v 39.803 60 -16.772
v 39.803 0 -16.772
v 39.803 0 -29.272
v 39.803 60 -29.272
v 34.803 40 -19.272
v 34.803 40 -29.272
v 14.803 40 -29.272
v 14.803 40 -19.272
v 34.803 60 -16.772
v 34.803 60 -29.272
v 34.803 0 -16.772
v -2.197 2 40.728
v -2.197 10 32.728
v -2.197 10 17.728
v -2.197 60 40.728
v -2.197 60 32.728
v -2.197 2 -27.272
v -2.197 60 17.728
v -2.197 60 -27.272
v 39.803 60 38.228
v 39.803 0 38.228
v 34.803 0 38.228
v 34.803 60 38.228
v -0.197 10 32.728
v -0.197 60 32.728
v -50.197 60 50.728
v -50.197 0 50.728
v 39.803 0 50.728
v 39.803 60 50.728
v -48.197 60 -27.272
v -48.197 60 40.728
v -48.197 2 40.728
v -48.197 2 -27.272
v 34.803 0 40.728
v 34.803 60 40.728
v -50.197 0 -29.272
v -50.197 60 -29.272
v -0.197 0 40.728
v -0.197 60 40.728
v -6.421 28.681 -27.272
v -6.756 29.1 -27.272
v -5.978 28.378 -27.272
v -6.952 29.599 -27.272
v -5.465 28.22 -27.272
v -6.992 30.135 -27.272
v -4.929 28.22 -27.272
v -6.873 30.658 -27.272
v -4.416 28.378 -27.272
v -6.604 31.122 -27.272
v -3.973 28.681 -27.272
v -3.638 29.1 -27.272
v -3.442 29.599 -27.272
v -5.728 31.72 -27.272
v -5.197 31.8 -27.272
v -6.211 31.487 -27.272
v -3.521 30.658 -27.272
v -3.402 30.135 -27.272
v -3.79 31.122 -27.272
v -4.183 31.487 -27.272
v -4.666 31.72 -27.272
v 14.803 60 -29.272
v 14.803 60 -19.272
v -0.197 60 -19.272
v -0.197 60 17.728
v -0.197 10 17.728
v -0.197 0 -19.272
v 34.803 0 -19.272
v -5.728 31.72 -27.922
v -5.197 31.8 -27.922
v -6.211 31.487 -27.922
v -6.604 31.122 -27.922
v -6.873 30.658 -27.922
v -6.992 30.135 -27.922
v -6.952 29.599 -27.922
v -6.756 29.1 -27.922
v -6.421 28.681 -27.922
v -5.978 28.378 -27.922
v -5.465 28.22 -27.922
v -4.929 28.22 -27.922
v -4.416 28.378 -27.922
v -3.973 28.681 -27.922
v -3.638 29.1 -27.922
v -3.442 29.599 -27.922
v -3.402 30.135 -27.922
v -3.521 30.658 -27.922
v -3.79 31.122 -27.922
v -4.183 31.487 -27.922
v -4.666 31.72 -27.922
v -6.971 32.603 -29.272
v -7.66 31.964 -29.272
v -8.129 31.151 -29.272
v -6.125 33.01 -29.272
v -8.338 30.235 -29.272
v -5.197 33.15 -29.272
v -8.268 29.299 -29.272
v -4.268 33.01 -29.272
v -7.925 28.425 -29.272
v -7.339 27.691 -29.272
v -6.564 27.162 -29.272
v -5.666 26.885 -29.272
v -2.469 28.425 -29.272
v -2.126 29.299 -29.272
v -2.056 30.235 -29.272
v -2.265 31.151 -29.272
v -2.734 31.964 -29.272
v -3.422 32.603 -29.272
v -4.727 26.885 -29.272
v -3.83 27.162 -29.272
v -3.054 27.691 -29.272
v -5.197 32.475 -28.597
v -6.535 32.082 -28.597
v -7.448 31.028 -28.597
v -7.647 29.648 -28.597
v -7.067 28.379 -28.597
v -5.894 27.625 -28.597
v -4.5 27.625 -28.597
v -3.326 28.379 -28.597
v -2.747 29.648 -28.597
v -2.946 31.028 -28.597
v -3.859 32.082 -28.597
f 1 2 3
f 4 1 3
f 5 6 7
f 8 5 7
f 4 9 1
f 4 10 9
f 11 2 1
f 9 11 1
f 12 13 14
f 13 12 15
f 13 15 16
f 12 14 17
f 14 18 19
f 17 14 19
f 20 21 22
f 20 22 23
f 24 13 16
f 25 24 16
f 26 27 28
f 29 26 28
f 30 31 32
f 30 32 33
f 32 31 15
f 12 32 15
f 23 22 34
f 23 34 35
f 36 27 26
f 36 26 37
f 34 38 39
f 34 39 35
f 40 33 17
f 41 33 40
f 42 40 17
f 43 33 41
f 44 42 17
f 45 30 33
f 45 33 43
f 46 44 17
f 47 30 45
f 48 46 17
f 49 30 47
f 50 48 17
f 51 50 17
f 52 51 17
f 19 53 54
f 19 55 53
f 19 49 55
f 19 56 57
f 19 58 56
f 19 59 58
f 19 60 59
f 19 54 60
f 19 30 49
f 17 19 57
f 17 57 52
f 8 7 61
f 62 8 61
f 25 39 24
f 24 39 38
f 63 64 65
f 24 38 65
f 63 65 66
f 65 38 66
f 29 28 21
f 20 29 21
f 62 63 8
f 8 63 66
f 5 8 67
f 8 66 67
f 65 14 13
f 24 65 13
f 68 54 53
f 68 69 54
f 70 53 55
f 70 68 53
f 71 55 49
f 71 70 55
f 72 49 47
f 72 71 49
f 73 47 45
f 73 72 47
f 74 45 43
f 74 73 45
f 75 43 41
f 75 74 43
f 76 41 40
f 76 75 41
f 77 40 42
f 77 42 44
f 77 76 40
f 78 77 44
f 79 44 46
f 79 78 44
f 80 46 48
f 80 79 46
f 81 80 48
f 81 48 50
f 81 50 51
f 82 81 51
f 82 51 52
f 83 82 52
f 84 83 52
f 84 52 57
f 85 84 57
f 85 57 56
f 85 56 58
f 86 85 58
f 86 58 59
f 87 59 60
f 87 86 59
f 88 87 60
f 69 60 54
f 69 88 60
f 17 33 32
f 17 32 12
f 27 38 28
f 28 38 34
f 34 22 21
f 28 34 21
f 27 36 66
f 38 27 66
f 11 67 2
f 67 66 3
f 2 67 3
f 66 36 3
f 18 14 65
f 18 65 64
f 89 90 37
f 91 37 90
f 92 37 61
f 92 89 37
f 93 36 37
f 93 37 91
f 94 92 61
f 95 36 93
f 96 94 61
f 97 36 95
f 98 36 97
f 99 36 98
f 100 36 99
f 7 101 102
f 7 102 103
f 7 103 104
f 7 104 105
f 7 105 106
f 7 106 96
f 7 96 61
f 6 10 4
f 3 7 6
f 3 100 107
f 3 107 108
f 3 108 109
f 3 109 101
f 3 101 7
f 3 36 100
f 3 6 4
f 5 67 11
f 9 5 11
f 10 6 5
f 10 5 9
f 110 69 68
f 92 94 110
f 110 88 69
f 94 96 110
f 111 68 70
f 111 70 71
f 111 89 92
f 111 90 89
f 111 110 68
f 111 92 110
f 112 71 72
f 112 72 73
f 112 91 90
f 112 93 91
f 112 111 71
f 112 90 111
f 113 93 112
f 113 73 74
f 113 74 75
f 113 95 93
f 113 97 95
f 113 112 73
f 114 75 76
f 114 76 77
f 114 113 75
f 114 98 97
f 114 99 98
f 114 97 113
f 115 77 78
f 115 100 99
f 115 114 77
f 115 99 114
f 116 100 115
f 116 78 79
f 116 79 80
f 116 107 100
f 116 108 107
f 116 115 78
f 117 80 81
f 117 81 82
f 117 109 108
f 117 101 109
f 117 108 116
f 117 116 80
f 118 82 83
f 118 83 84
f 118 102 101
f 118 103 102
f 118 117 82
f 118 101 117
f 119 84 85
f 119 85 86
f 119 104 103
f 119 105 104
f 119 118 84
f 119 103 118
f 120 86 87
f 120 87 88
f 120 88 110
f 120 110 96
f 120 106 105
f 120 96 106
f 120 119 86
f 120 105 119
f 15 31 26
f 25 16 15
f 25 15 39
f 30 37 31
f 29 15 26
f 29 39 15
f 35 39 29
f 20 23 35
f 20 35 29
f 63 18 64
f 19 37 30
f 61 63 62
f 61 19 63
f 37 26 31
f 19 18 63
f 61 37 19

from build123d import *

# Parameters (mm, degrees)
SKETCH1_W           = 90
SKETCH1_H           = 80
SKETCH1_W_2         = 35
SKETCH1_H_2         = 60
BOSS_EXTRUDE1_DEPTH = 60
SKETCH2_W           = 46
SKETCH2_H           = 68
CUT_EXTRUDE1_DEPTH  = 58
SKETCH3_W           = 15
SKETCH3_H           = 50
CUT_EXTRUDE2_DEPTH  = 2
SKETCH4_W           = 20
SKETCH4_H           = 20
CUT_EXTRUDE3_DEPTH  = 10
SKETCH5_W           = 55
SKETCH5_H           = 60
CUT_EXTRUDE4_DEPTH  = 10


with BuildPart() as part:
    # Sketch1 → Boss-Extrude1 (new body)
    with BuildSketch(Plane(origin=(0, 0, 0), x_dir=(1, 0, 0), z_dir=(0, 1, 0))):
        with Locations((-5.196940727, -10.728489484)):
            Rectangle(SKETCH1_W, SKETCH1_H)
        with Locations((17.303059273, -10.728489484)):
            Rectangle(SKETCH1_W_2, SKETCH1_H_2, mode=Mode.SUBTRACT)
    extrude(amount=BOSS_EXTRUDE1_DEPTH)

    # Sketch2 → Cut-Extrude1 (cut)
    with BuildSketch(Plane(origin=(0, 60, 0), x_dir=(1, 0, 0), z_dir=(0, 1, 0))):
        with Locations((-25.196940727, -6.728489484)):
            Rectangle(SKETCH2_W, SKETCH2_H)
    extrude(amount=-CUT_EXTRUDE1_DEPTH, mode=Mode.SUBTRACT)

    # Sketch3 → Cut-Extrude2 (cut)
    with BuildSketch(Plane.ZY.offset(2.196940727)):
        with Locations((25.228489484, 35)):
            Rectangle(SKETCH3_W, SKETCH3_H)
    extrude(amount=-CUT_EXTRUDE2_DEPTH, mode=Mode.SUBTRACT)

    # Sketch4 → Cut-Extrude3 (cut)
    with BuildSketch(Plane(origin=(0, 0, -29.271510516), x_dir=(-1, 0, 0), z_dir=(0, 0, -1))):
        with Locations((-24.803059273, 50)):
            Rectangle(SKETCH4_W, SKETCH4_H)
    extrude(amount=-CUT_EXTRUDE3_DEPTH, mode=Mode.SUBTRACT)

    # Sketch5 → Cut-Extrude4 (cut)
    with BuildSketch(Plane(origin=(39.803059273, 0, 0), x_dir=(0, 0, -1), z_dir=(1, 0, 0))):
        with Locations((-10.728489484, 30)):
            Rectangle(SKETCH5_W, SKETCH5_H)
    extrude(amount=-CUT_EXTRUDE4_DEPTH, mode=Mode.SUBTRACT)

    # Sketch14 → CSK for M3 Flat Head Machine Screw1 (revolve, cut)
    with BuildSketch(Plane(origin=(-5.196940727, 30, -29.271510516), x_dir=(0, 1, 0), z_dir=(1, 0, 0))):
        Polygon((0, 0), (0, 3.081549114), (1.8, 2), (1.8, 1.35), (3.15, 0), align=None)
    revolve(axis=Axis((-5.196940727, 30, -35.621510516), (0, 0, 1)), mode=Mode.SUBTRACT)


solid = part.part
